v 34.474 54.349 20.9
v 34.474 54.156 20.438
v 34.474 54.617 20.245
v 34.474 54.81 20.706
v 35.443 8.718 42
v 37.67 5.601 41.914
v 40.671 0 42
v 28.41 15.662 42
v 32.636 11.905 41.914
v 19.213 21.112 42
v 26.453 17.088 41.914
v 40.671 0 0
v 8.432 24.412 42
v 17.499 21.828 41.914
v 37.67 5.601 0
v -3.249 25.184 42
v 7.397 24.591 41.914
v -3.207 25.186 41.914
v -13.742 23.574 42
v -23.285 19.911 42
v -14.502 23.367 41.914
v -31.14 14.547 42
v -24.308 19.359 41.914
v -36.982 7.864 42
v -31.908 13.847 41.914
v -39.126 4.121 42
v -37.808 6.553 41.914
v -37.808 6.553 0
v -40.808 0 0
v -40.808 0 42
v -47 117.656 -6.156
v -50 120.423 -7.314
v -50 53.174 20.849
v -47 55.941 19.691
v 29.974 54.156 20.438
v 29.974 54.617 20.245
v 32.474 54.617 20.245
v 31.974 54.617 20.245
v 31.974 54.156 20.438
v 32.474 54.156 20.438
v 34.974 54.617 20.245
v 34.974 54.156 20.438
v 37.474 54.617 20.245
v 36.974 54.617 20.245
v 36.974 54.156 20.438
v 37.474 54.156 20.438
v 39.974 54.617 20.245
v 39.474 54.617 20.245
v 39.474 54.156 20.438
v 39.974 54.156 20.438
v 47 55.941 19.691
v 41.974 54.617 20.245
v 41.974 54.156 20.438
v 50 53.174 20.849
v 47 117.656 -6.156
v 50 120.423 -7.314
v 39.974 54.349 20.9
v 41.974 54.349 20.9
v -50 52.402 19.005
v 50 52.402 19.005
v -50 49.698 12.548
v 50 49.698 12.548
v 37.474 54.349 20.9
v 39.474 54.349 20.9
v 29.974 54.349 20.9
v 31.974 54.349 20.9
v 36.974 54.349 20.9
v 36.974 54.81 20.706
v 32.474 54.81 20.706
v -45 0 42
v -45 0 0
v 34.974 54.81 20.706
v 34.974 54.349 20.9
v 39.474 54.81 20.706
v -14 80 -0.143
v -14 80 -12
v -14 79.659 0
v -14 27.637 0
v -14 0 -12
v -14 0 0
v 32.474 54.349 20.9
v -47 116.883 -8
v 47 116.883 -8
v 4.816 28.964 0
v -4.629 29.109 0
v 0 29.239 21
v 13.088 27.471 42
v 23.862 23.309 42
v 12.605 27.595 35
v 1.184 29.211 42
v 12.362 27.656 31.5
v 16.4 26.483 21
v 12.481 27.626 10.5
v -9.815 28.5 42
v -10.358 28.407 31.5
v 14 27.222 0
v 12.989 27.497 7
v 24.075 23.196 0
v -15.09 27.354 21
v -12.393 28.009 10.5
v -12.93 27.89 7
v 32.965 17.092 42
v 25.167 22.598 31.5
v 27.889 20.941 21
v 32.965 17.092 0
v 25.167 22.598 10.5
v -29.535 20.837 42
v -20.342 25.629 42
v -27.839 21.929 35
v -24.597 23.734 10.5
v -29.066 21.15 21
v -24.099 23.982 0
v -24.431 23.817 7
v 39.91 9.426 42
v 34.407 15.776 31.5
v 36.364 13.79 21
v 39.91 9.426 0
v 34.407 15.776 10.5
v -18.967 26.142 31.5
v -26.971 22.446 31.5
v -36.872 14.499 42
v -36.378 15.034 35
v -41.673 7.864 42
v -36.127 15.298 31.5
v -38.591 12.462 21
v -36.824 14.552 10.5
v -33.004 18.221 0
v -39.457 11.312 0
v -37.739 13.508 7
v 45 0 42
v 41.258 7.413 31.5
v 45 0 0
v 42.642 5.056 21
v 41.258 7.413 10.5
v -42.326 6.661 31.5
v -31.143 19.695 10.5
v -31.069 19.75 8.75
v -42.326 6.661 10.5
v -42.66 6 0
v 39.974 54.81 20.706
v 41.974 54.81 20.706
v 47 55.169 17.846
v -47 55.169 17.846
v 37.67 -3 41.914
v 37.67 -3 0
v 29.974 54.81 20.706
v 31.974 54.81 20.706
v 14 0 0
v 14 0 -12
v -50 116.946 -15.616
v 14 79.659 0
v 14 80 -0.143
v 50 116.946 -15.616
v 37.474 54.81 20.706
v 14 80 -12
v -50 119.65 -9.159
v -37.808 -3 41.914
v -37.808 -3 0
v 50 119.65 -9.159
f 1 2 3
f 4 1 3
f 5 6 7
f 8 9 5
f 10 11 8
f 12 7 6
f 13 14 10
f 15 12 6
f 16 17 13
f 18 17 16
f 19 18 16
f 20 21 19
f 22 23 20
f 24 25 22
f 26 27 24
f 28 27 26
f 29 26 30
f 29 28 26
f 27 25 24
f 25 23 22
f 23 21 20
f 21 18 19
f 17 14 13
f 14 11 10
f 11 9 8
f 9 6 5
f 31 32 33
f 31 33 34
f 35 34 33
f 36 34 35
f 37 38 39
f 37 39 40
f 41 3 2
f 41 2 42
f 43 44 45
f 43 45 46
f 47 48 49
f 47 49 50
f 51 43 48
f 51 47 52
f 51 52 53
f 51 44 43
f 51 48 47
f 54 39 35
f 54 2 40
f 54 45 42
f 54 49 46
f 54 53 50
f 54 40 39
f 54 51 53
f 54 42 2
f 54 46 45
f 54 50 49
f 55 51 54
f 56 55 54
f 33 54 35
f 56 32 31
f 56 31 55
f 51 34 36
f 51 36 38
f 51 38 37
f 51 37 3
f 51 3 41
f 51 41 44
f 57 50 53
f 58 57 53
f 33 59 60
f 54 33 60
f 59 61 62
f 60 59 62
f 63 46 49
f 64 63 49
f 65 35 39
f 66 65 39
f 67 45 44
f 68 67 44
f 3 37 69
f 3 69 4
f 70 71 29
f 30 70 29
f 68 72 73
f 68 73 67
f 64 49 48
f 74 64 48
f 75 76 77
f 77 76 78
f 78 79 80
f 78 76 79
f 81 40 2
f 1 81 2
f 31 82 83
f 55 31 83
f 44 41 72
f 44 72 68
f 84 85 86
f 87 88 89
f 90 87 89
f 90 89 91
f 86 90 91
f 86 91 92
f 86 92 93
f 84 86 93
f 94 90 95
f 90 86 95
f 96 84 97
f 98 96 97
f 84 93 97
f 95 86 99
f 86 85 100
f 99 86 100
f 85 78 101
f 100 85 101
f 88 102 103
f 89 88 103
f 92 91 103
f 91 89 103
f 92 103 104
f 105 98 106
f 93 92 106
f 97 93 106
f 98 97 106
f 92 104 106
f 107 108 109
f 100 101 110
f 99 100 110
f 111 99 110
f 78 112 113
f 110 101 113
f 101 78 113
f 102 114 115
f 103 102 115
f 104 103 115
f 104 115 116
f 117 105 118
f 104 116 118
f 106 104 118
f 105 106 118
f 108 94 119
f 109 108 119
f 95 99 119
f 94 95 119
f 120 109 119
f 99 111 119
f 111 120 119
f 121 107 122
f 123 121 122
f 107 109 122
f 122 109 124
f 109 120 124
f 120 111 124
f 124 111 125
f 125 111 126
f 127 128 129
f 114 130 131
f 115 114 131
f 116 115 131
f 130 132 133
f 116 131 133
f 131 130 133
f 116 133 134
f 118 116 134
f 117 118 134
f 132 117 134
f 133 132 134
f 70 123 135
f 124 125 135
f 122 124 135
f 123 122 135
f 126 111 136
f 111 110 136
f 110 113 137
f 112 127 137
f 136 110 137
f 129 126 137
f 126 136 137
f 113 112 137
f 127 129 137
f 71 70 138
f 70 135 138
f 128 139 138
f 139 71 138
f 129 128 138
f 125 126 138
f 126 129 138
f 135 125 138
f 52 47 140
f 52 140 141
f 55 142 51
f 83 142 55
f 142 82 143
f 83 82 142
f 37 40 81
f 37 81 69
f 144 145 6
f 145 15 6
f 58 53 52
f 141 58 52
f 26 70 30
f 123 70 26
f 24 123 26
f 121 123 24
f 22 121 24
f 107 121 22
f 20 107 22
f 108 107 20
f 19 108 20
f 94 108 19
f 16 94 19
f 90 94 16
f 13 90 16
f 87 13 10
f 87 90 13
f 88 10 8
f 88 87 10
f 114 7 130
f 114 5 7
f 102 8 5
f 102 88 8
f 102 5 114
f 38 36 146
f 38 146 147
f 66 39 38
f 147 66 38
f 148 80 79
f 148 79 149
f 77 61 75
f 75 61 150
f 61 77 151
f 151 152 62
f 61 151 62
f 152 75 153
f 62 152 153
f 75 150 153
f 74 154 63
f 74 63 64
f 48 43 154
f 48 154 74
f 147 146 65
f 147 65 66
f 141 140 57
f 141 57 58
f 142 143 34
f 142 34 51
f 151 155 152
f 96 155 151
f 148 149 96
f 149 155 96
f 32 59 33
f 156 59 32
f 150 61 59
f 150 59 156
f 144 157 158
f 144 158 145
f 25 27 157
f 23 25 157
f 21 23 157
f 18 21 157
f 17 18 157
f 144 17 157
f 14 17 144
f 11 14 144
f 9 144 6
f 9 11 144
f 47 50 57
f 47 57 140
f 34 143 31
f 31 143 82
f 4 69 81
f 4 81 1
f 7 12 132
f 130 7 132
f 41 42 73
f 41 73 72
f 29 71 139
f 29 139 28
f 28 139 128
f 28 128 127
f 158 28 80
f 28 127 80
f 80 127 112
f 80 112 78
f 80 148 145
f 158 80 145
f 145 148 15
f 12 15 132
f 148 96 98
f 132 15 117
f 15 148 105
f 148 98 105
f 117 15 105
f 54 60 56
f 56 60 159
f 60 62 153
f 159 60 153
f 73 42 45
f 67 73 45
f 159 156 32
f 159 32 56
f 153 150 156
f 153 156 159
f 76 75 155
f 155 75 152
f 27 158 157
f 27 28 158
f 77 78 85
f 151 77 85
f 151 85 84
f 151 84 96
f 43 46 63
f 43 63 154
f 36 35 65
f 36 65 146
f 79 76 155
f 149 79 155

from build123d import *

# Parameters (mm, degrees)
F1_DEPTH  = 42
F2_W      = 75.478619273
F2_H      = 41.9138409197
F4_W      = 75.478619273
F4_H      = 41.9138409197
F5_DEPTH  = 3
F6_W      = 28
F6_H      = 12
F8_DEPTH  = 80
F11_W     = 100
F11_H     = 72.9077620213
F12_DEPTH = 7
F13_W     = 100
F13_H     = 72.9077620213
F13_W_2   = 94
F13_H_2   = 66.9077620213
F14_DEPTH = 2
F15_W     = 2
F15_H     = 0.5
F16_DEPTH = 0.5


# Not quite as in the source:
# - ends of sketch curves that miss each other by under 0.0002 mm in the source are joined
# - the dataset's text gives a spline's control points without its knots; the knots are read off the source's solid


with BuildPart() as f1:
    # F0 (on Top) → F1 (new body)
    with BuildSketch(Plane.XY):
        with BuildLine():
            Line((40.6705020705, 0), (45, 0))
            add(Edge.make_bspline(
                [(45, 0), (37.6566936716, 18.7177697445), (0.7563031661, 39.2432392178), (-39.1693000037, 19.753647335), (-45, 0)],
                knots=[0, 0, 0, 0, 0.5, 1, 1, 1, 1], degree=3))
            Line((-45, 0), (-40.8081785045, 0))
            add(Edge.make_bspline(
                [(40.6705020705, 0), (39.0654786869, 3.6685119371), (34.6366166878, 10.6499395063), (25.1941828283, 18.6625093529), (13.2155095249, 23.898149118), (2.1979882903, 25.5001155824), (-6.7612672319, 25.0396744323), (-15.5822493226, 23.419843787), (-23.8190972997, 20.0776830737), (-30.7940742115, 15.0930436532), (-35.2531784066, 10.5526098036), (-38.6097824931, 5.5150177421), (-40.2124471126, 1.7897260912), (-40.8081785045, 0)],
                knots=[0.0144696894, 0.0144696894, 0.0144696894, 0.0144696894, 0.125, 0.25, 0.375, 0.5, 0.5625, 0.625, 0.75, 0.8125, 0.875, 0.9375, 0.989221235, 0.989221235, 0.989221235, 0.989221235], degree=3))
        make_face()
    extrude(amount=F1_DEPTH)

    # F2 (on Front) → F3 (join, up to the next surface of F1)
    with BuildSketch(Plane.XZ):
        with Locations((-0.0689039235, 20.9569204599)):
            Rectangle(F2_W, F2_H)
    extrude(until=Until.NEXT, dir=(0, 1, 0))

    # F4 (on face) → F5 (join)
    with BuildSketch(Plane.XZ):
        with Locations((-0.0689039235, 20.9569204599)):
            Rectangle(F4_W, F4_H)
    extrude(amount=F5_DEPTH)

    # F6 (on Front) → F8 (join)
    with BuildSketch(Plane.XZ):
        with Locations((0, -6)):
            Rectangle(F6_W, F6_H)
    extrude(amount=-F8_DEPTH)

    # F11 (on face) → F12 (join)
    with BuildSketch(Plane(origin=(0, 11.8870032706, 28.3832509576), x_dir=(1, 0, 0), z_dir=(0, 0.3862941051, 0.9223756634))):
        with Locations((0, 77.4465687573)):
            Rectangle(F11_W, F11_H)
    extrude(amount=F12_DEPTH)

    # F13 (on face) → F14 (join)
    with BuildSketch(Plane(origin=(0, 14.591062006, 34.8398806013), x_dir=(1, 0, 0), z_dir=(0, 0.3862941051, 0.9223756634))):
        with Locations((0, 77.4465687573)):
            Rectangle(F13_W, F13_H)
        with Locations((0, 77.4465687573)):
            Rectangle(F13_W_2, F13_H_2, mode=Mode.SUBTRACT)
    extrude(amount=F14_DEPTH)

    # F15 (on face) → F16 (join)
    with BuildSketch(Plane(origin=(0, 15.3636502161, 36.684631928), x_dir=(1, 0, 0), z_dir=(0, 0.3862941051, 0.9223756634))):
        with Locations((33.4735295493, 42.3066589715)):
            Rectangle(F15_W, F15_H)
        with Locations((35.9735295493, 42.3066589715)):
            Rectangle(F15_W, F15_H)
        with Locations((38.4735295493, 42.3066589715)):
            Rectangle(F15_W, F15_H)
        with Locations((40.9735295493, 42.3066589715)):
            Rectangle(F15_W, F15_H)
        with Locations((30.9735295493, 42.3066589715)):
            Rectangle(F15_W, F15_H)
    extrude(amount=F16_DEPTH)


solid = f1.part
